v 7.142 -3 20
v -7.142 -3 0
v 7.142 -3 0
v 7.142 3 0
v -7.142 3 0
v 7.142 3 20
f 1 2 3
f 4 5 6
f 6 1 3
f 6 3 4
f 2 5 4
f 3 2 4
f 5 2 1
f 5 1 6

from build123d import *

# Parameters (mm, degrees)
F0_W     = 14.2837
F0_H     = 6
F1_DEPTH = 20
F2_SIZE2 = 19.99999
F2_SIZE  = 14.28369


# Not quite as in the source:
# - a fillet or chamfer is up to 0.001 mm smaller than in the source, because OpenCascade refuses the exact size


with BuildPart() as f1:
    # F0 (on Top) → F1 (new body)
    with BuildSketch(Plane.XY):
        Rectangle(F0_W, F0_H)
    extrude(amount=F1_DEPTH)

    # F2 (size 14.2837 and 20 in the source; OpenCascade refuses exactly that, so slightly less here)
    f2_edges = [f1.edges().sort_by_distance(p)[0] for p in [
        (-7.14185, 0, 20),
    ]]
    f2_side = f1.faces().sort_by_distance((0, 0, 20))[0]
    chamfer(f2_edges, length=F2_SIZE, length2=F2_SIZE2, reference=f2_side)


solid = f1.part
